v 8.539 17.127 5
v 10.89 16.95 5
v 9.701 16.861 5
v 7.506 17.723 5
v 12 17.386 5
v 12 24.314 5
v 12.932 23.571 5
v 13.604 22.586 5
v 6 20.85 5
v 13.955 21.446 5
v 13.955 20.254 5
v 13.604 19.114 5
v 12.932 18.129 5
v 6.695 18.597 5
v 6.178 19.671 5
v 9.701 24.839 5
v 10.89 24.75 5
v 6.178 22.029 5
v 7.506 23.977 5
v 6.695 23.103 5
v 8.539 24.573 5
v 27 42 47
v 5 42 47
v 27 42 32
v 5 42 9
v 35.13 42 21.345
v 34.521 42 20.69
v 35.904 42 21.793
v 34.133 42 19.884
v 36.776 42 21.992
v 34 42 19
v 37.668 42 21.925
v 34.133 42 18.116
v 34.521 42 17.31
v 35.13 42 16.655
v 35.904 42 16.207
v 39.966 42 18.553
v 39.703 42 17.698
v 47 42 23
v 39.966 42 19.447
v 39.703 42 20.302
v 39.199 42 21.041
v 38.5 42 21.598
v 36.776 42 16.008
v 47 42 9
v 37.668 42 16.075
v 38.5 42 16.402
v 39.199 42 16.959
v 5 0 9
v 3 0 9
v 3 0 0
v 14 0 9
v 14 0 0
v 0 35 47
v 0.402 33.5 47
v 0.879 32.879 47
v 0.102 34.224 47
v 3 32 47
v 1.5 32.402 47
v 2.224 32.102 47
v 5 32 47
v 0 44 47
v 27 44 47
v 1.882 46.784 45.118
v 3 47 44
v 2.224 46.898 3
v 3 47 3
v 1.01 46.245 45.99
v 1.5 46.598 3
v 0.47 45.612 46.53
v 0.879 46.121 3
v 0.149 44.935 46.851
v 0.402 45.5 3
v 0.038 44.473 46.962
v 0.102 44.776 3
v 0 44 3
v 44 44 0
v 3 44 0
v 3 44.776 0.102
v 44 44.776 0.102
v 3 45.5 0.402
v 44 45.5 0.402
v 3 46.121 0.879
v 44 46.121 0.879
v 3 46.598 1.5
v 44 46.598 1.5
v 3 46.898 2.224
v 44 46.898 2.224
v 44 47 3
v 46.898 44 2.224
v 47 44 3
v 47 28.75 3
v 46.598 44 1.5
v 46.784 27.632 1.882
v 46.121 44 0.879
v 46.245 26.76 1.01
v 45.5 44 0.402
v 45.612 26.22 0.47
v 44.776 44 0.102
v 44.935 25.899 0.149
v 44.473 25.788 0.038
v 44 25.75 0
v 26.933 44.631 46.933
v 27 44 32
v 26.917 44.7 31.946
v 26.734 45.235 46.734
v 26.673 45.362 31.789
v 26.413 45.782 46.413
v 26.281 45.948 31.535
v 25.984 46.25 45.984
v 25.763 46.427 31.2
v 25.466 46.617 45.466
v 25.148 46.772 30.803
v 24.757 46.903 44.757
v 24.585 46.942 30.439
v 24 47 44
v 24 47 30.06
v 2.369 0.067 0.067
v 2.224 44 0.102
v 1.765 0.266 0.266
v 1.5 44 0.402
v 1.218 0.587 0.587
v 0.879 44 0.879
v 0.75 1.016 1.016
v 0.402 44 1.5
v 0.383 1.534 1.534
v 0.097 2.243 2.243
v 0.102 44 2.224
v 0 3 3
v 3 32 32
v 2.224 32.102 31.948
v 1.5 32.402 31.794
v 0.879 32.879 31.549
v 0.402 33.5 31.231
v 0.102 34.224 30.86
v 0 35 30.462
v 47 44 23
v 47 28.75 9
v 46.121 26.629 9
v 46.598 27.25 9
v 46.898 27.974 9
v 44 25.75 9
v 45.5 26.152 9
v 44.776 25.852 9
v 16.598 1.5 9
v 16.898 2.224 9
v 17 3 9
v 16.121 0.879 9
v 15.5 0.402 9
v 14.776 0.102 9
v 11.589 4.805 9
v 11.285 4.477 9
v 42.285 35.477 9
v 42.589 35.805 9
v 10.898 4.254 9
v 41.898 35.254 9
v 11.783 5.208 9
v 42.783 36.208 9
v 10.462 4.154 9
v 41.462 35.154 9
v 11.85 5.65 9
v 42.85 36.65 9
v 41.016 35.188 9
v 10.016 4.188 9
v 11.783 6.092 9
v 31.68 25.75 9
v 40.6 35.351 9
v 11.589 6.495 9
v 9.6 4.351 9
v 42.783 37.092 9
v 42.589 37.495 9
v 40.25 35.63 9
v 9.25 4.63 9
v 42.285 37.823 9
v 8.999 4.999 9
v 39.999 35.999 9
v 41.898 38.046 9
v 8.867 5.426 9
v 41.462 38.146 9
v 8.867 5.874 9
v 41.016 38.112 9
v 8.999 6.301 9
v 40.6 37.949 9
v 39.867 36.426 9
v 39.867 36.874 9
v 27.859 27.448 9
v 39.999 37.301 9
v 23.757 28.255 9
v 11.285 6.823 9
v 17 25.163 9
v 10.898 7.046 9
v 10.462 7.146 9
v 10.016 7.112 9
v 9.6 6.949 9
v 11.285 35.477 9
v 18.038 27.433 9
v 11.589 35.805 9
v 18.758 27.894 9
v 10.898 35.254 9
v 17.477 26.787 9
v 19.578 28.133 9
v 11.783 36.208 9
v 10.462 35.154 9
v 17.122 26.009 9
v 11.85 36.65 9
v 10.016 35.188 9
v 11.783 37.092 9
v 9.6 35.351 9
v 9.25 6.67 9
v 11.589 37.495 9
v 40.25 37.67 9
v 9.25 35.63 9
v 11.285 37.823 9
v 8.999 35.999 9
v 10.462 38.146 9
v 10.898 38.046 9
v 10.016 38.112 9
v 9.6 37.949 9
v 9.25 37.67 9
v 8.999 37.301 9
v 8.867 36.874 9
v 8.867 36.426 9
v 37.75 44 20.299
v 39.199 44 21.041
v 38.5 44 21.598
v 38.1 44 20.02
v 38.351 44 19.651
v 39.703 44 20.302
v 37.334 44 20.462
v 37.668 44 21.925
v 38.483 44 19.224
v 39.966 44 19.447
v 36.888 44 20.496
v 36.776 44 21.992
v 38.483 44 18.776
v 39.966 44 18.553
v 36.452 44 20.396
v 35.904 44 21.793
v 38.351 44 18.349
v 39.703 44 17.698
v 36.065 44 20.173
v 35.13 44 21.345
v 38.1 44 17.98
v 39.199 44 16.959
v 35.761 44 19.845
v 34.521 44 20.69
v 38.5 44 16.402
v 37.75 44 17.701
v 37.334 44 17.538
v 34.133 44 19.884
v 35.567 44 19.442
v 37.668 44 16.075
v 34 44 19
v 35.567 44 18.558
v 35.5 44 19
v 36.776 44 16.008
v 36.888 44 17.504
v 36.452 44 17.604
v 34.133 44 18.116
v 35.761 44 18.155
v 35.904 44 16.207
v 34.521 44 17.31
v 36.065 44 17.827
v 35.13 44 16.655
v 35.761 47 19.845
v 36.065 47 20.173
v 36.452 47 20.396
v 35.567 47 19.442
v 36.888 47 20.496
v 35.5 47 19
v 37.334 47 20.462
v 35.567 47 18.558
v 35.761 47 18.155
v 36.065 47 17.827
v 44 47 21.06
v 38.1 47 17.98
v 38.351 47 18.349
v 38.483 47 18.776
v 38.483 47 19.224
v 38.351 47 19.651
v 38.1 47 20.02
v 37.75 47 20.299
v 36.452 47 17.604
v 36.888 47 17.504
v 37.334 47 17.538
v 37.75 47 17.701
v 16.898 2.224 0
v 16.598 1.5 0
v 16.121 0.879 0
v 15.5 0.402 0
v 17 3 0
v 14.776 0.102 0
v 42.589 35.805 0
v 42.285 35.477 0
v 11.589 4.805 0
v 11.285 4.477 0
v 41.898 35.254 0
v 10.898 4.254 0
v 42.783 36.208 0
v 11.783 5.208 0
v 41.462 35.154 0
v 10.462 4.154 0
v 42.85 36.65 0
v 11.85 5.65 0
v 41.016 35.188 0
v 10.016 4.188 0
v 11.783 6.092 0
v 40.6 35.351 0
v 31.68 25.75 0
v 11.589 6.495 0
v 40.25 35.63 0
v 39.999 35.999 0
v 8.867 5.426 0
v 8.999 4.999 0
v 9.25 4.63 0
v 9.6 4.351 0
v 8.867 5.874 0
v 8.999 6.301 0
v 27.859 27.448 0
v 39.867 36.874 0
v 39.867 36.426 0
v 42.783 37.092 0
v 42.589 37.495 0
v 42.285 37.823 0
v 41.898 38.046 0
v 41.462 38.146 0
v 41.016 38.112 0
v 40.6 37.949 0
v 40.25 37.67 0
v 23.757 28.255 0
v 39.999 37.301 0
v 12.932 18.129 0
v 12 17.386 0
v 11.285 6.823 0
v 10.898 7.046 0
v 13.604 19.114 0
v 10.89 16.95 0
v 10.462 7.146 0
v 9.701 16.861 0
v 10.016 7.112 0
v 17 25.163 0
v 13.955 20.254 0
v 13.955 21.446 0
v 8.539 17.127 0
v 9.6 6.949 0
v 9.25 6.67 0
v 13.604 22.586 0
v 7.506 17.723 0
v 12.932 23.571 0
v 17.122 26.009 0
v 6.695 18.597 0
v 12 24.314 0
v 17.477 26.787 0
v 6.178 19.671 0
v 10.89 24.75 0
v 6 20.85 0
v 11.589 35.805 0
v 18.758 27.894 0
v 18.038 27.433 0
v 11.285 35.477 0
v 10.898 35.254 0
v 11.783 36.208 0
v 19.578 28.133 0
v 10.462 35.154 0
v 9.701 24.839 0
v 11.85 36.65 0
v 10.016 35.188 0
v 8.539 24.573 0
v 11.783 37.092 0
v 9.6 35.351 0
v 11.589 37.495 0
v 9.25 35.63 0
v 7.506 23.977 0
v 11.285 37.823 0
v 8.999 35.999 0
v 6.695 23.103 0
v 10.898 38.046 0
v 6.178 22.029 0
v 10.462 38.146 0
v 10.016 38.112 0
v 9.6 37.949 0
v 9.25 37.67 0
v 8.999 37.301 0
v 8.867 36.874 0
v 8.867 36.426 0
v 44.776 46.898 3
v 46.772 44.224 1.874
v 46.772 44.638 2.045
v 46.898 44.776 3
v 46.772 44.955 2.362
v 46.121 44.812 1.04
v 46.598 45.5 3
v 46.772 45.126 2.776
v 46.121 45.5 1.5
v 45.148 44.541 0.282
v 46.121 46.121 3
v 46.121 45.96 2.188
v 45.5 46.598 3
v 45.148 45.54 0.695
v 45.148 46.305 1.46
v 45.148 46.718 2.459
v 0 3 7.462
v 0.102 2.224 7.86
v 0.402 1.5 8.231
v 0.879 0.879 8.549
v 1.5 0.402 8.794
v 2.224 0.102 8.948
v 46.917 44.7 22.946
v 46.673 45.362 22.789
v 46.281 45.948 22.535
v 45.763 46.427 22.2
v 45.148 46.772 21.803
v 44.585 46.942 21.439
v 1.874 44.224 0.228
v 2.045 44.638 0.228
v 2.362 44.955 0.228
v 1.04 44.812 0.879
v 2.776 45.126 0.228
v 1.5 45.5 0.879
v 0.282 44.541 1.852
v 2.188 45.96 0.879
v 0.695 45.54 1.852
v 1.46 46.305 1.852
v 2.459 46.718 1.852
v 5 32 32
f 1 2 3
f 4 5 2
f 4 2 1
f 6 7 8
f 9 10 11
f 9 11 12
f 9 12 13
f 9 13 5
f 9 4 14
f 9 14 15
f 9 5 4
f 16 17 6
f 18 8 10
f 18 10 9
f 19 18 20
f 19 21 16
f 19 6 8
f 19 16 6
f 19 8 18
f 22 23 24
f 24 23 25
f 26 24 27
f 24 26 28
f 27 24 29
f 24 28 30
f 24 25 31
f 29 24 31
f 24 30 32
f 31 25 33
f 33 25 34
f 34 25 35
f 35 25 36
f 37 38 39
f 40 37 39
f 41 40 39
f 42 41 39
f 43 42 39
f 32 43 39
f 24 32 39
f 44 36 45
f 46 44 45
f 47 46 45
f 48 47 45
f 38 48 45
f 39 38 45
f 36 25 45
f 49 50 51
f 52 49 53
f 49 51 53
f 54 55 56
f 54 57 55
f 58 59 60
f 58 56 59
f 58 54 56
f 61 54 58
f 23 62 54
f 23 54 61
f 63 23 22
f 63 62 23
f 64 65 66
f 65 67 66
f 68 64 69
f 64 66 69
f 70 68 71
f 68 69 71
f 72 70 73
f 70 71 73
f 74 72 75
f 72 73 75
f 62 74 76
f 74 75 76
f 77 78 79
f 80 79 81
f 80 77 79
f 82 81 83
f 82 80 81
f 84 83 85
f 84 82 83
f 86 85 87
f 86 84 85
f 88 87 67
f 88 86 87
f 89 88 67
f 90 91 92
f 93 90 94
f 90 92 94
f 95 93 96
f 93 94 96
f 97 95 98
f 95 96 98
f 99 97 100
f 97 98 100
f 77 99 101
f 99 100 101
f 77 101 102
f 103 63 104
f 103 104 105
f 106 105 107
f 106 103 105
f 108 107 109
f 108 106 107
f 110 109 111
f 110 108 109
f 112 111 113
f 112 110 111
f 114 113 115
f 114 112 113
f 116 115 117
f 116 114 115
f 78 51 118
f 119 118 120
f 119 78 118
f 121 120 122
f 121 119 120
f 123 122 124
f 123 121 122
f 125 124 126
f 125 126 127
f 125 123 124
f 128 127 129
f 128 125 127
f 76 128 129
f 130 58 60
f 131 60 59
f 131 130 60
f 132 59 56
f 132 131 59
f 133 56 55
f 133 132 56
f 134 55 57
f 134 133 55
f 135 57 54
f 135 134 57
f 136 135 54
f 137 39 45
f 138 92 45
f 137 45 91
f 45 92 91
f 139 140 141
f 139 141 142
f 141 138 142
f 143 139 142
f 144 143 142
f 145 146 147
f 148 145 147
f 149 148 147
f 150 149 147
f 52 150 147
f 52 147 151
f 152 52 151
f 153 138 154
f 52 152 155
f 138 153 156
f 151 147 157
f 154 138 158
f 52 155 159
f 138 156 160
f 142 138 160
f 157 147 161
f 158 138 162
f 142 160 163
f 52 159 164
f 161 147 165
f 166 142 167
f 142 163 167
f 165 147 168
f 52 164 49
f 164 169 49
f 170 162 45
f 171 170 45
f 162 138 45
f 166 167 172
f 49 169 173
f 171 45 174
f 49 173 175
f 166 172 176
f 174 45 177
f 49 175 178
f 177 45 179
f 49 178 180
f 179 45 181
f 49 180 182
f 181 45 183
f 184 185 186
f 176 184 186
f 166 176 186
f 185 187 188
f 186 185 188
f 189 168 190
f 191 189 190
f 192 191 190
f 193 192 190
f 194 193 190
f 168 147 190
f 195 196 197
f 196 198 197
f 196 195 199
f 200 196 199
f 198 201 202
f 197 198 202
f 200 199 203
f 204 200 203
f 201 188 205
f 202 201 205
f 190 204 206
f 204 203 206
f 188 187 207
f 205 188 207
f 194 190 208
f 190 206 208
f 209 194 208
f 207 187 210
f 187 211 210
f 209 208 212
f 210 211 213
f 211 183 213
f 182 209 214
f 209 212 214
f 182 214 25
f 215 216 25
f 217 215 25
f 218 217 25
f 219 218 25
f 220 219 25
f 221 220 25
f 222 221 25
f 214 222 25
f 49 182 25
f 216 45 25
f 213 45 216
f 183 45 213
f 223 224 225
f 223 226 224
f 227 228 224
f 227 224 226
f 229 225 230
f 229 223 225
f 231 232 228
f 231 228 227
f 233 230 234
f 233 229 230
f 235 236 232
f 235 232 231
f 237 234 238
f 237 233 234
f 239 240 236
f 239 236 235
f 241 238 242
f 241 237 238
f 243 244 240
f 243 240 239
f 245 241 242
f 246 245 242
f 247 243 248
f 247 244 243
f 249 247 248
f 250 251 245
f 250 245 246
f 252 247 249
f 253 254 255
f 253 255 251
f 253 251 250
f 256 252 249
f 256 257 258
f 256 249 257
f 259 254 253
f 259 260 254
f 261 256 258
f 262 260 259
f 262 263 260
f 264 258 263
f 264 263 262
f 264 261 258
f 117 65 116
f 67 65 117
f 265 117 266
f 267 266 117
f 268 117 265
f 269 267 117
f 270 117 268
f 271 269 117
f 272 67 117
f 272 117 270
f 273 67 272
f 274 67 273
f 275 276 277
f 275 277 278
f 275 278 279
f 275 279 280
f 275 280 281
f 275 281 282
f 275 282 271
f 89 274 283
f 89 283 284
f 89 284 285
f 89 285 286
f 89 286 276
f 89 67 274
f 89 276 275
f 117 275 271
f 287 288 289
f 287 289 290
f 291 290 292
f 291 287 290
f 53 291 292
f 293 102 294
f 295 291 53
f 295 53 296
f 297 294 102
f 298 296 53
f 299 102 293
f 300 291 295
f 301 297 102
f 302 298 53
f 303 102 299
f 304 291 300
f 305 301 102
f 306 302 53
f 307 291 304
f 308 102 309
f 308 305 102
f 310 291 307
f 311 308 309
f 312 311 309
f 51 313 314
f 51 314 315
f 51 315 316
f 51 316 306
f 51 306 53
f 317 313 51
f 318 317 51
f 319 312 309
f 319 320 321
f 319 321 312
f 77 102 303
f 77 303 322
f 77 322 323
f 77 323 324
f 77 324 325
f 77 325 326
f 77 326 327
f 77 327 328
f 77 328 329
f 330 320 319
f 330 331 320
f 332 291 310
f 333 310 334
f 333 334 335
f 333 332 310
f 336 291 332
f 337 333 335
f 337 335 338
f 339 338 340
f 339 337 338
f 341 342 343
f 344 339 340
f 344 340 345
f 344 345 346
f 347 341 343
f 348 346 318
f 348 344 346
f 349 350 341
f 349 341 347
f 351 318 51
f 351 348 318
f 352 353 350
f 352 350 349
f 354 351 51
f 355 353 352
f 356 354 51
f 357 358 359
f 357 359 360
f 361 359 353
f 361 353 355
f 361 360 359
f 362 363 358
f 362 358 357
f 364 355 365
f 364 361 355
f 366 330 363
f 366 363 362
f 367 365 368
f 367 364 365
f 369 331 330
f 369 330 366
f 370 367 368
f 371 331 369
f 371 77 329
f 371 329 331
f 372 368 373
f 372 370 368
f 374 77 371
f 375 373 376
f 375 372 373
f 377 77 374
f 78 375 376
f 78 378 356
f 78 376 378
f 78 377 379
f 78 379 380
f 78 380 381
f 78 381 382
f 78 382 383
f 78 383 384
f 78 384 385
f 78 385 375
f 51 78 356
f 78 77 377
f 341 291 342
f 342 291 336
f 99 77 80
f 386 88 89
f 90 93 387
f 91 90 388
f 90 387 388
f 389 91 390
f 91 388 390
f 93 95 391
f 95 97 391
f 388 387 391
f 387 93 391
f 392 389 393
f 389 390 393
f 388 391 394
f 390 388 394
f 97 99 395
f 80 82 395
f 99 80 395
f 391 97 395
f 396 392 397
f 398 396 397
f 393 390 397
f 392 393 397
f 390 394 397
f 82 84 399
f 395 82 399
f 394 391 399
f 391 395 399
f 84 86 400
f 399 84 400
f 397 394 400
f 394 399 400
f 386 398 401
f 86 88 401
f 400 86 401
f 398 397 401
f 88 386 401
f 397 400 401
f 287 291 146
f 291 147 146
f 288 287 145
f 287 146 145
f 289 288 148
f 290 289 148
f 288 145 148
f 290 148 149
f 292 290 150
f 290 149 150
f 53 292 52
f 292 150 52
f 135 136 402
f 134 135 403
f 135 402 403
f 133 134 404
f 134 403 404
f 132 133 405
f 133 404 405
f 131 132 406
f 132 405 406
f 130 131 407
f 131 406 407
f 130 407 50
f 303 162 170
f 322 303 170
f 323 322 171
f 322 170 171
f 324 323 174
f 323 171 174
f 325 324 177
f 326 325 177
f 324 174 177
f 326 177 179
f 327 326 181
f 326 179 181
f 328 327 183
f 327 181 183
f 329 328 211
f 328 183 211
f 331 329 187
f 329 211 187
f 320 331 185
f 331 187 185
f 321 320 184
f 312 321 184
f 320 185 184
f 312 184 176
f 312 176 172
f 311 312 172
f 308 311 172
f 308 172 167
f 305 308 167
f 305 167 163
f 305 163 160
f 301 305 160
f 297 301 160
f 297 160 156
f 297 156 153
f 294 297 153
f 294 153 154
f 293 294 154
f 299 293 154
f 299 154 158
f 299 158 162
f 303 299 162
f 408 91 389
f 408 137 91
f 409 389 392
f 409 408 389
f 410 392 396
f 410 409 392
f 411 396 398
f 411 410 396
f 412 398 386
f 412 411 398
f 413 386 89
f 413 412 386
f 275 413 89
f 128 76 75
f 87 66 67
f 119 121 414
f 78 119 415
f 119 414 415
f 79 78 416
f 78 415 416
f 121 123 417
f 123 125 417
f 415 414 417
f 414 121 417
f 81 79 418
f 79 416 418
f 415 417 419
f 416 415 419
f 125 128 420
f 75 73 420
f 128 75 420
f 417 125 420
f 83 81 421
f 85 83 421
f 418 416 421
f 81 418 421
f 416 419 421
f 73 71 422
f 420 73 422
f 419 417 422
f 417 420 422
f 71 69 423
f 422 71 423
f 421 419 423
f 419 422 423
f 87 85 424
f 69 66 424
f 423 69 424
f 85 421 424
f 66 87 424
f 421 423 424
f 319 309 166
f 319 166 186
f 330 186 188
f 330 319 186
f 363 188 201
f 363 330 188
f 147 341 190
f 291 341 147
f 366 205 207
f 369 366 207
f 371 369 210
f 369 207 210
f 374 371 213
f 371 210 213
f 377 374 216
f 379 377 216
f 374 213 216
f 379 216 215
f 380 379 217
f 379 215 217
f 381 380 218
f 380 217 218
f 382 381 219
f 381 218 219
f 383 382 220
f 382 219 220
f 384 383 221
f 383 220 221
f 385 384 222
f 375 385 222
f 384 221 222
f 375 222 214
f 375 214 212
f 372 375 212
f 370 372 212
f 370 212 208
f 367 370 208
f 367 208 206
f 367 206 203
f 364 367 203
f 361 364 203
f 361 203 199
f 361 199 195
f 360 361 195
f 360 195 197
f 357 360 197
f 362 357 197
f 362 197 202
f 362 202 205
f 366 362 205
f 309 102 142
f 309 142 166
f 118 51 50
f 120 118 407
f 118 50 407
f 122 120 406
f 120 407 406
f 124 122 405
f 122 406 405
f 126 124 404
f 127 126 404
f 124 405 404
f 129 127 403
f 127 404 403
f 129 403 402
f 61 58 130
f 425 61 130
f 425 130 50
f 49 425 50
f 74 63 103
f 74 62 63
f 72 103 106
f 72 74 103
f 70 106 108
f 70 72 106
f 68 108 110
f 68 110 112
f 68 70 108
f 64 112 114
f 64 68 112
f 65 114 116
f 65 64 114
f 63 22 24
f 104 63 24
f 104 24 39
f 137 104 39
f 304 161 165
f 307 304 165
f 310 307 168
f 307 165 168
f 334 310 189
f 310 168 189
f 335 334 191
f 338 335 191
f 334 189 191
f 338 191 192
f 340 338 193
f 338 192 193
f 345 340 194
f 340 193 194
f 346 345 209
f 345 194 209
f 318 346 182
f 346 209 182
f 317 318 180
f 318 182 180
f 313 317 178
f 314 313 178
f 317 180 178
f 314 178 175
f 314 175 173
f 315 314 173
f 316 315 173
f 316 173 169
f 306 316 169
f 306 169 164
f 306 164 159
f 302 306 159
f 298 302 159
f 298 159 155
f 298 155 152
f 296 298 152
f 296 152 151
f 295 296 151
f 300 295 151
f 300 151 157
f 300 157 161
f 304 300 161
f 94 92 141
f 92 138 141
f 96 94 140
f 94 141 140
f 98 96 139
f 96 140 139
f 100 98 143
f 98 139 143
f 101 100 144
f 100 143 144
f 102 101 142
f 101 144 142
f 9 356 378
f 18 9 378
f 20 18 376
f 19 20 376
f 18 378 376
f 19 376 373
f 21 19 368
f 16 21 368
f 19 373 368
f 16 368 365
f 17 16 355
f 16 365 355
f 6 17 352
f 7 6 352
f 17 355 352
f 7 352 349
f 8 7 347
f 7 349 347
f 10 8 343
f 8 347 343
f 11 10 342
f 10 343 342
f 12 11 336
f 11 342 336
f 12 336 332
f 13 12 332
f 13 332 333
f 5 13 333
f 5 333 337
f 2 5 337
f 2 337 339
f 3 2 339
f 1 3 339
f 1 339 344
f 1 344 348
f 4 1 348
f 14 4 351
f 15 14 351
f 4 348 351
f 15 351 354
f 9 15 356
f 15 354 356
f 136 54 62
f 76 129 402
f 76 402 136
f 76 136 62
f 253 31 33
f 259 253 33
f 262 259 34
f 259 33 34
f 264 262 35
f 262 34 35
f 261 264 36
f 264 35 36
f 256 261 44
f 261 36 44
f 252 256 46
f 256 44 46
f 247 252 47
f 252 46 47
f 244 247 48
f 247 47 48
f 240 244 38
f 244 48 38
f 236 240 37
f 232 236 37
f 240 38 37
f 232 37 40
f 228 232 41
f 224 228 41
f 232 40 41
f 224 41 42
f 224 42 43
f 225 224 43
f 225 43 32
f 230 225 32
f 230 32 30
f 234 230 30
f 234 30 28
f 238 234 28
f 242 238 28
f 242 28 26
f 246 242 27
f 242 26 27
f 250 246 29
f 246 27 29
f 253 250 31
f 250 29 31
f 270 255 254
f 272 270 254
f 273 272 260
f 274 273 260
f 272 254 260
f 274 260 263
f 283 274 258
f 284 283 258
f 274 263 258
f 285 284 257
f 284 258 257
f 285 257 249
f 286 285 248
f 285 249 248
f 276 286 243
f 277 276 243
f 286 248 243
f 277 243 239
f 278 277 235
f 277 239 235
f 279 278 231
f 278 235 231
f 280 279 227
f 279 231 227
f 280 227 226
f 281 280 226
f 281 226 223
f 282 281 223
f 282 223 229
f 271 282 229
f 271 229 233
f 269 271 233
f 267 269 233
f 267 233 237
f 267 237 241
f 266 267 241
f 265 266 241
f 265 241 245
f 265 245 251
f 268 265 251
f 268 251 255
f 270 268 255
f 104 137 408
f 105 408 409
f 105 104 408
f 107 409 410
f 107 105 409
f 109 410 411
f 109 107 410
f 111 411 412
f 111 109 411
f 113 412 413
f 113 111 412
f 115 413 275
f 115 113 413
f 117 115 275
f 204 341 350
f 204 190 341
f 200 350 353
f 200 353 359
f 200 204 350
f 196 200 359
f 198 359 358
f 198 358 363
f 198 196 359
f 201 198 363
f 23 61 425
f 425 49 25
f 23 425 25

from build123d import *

# Parameters (mm, degrees)
BOSS_EXTRUDE1_DEPTH = 9
SKETCH3_R           = 1.5
CUT_EXTRUDE1_DEPTH  = 10
SKETCH4_W           = 5
SKETCH4_H           = 47
BOSS_EXTRUDE2_DEPTH = 38
CUT_EXTRUDE2_DEPTH  = 38
SKETCH6_W           = 42
SKETCH6_H           = 5
BOSS_EXTRUDE3_DEPTH = 38
SKETCH7_R           = 4
CUT_EXTRUDE3_DEPTH  = 5
CUT_EXTRUDE4_DEPTH  = 10
FILLET1_R           = 3
SKETCH9_R           = 1.5
CUT_EXTRUDE5_DEPTH  = 10
SKETCH10_R          = 3
CUT_EXTRUDE6_DEPTH  = 2


with BuildPart() as part:
    # Sketch2 → Boss-Extrude1 (new body)
    with BuildSketch(Plane.XY):
        with BuildLine():
            Line((0, 0), (0, 47))
            Line((0, 47), (47, 47))
            Line((47, 47), (47, 25.75))
            Line((47, 25.75), (31.68, 25.75))
            ThreePointArc((31.68, 25.75), (24.5283031, 28.175540714), (17, 27.58))
            Line((17, 27.58), (17, 0))
            Line((17, 0), (0, 0))
        make_face()
    extrude(amount=BOSS_EXTRUDE1_DEPTH)

    # Sketch3 → Cut-Extrude1 (cut)
    with BuildSketch(Plane.XY.offset(9)):
        with Locations((10.35, 5.65)):
            Circle(SKETCH3_R)
        with Locations((10.35, 36.65)):
            Circle(SKETCH3_R)
        with Locations((41.35, 36.65)):
            Circle(SKETCH3_R)
    extrude(amount=-CUT_EXTRUDE1_DEPTH, mode=Mode.SUBTRACT)

    # Sketch4 → Boss-Extrude2 (add)
    with BuildSketch(Plane.XY.offset(9)):
        with Locations((2.5, 23.5)):
            Rectangle(SKETCH4_W, SKETCH4_H)
    extrude(amount=BOSS_EXTRUDE2_DEPTH)

    # Sketch5 → Cut-Extrude2 (cut)
    with BuildSketch(Plane.ZY):
        Polygon((47, 32), (32, 32), (9, 0), (47, 0), align=None)
    extrude(amount=-CUT_EXTRUDE2_DEPTH, mode=Mode.SUBTRACT)

    # Sketch6 → Boss-Extrude3 (add)
    with BuildSketch(Plane.XY.offset(9)):
        with Locations((26, 44.5)):
            Rectangle(SKETCH6_W, SKETCH6_H)
    extrude(amount=BOSS_EXTRUDE3_DEPTH)

    # Sketch7 → Cut-Extrude3 (cut)
    with BuildSketch(Plane(origin=(0, 0, 0), x_dir=(-1, 0, 0), z_dir=(0, 0, -1))):
        with Locations((-10, 20.85)):
            Circle(SKETCH7_R)
    extrude(amount=-CUT_EXTRUDE3_DEPTH, mode=Mode.SUBTRACT)

    # Sketch8 → Cut-Extrude4 (cut)
    with BuildSketch(Plane(origin=(0, 42, 0), x_dir=(-1, 0, 0), z_dir=(0, -1, 0))):
        Polygon((-27, -32), (-47, -23), (-47, -47), (-27, -47), align=None)
    extrude(amount=-CUT_EXTRUDE4_DEPTH, mode=Mode.SUBTRACT)

    # Fillet1
    fillet1_edges = [part.edges().sort_by_distance(p)[0] for p in [
        (0, 47, 23.5),
        (47, 25.75, 4.5),
        (17, 27.58, 4.5),
        (17, 0, 4.5),
        (0, 0, 4.5),
        (0, 32, 39.5),
        (0, 16, 20.5),
        (0, 23.5, 0),
        (23.5, 47, 0),
        (47, 36.375, 0),
        (13.5, 47, 47),
        (47, 47, 11.5),
        (27, 47, 39.5),
        (37, 47, 27.5),
    ]]
    fillet(fillet1_edges, radius=FILLET1_R)

    # Sketch9 → Cut-Extrude5 (cut)
    with BuildSketch(Plane(origin=(0, 42, 0), x_dir=(-1, 0, 0), z_dir=(0, -1, 0))):
        with Locations((-37, -19)):
            Circle(SKETCH9_R)
    extrude(amount=-CUT_EXTRUDE5_DEPTH, mode=Mode.SUBTRACT)

    # Sketch10 → Cut-Extrude6 (cut)
    with BuildSketch(Plane(origin=(0, 42, 0), x_dir=(-1, 0, 0), z_dir=(0, -1, 0))):
        with Locations((-37, -19)):
            Circle(SKETCH10_R)
    extrude(amount=-CUT_EXTRUDE6_DEPTH, mode=Mode.SUBTRACT)


solid = part.part
